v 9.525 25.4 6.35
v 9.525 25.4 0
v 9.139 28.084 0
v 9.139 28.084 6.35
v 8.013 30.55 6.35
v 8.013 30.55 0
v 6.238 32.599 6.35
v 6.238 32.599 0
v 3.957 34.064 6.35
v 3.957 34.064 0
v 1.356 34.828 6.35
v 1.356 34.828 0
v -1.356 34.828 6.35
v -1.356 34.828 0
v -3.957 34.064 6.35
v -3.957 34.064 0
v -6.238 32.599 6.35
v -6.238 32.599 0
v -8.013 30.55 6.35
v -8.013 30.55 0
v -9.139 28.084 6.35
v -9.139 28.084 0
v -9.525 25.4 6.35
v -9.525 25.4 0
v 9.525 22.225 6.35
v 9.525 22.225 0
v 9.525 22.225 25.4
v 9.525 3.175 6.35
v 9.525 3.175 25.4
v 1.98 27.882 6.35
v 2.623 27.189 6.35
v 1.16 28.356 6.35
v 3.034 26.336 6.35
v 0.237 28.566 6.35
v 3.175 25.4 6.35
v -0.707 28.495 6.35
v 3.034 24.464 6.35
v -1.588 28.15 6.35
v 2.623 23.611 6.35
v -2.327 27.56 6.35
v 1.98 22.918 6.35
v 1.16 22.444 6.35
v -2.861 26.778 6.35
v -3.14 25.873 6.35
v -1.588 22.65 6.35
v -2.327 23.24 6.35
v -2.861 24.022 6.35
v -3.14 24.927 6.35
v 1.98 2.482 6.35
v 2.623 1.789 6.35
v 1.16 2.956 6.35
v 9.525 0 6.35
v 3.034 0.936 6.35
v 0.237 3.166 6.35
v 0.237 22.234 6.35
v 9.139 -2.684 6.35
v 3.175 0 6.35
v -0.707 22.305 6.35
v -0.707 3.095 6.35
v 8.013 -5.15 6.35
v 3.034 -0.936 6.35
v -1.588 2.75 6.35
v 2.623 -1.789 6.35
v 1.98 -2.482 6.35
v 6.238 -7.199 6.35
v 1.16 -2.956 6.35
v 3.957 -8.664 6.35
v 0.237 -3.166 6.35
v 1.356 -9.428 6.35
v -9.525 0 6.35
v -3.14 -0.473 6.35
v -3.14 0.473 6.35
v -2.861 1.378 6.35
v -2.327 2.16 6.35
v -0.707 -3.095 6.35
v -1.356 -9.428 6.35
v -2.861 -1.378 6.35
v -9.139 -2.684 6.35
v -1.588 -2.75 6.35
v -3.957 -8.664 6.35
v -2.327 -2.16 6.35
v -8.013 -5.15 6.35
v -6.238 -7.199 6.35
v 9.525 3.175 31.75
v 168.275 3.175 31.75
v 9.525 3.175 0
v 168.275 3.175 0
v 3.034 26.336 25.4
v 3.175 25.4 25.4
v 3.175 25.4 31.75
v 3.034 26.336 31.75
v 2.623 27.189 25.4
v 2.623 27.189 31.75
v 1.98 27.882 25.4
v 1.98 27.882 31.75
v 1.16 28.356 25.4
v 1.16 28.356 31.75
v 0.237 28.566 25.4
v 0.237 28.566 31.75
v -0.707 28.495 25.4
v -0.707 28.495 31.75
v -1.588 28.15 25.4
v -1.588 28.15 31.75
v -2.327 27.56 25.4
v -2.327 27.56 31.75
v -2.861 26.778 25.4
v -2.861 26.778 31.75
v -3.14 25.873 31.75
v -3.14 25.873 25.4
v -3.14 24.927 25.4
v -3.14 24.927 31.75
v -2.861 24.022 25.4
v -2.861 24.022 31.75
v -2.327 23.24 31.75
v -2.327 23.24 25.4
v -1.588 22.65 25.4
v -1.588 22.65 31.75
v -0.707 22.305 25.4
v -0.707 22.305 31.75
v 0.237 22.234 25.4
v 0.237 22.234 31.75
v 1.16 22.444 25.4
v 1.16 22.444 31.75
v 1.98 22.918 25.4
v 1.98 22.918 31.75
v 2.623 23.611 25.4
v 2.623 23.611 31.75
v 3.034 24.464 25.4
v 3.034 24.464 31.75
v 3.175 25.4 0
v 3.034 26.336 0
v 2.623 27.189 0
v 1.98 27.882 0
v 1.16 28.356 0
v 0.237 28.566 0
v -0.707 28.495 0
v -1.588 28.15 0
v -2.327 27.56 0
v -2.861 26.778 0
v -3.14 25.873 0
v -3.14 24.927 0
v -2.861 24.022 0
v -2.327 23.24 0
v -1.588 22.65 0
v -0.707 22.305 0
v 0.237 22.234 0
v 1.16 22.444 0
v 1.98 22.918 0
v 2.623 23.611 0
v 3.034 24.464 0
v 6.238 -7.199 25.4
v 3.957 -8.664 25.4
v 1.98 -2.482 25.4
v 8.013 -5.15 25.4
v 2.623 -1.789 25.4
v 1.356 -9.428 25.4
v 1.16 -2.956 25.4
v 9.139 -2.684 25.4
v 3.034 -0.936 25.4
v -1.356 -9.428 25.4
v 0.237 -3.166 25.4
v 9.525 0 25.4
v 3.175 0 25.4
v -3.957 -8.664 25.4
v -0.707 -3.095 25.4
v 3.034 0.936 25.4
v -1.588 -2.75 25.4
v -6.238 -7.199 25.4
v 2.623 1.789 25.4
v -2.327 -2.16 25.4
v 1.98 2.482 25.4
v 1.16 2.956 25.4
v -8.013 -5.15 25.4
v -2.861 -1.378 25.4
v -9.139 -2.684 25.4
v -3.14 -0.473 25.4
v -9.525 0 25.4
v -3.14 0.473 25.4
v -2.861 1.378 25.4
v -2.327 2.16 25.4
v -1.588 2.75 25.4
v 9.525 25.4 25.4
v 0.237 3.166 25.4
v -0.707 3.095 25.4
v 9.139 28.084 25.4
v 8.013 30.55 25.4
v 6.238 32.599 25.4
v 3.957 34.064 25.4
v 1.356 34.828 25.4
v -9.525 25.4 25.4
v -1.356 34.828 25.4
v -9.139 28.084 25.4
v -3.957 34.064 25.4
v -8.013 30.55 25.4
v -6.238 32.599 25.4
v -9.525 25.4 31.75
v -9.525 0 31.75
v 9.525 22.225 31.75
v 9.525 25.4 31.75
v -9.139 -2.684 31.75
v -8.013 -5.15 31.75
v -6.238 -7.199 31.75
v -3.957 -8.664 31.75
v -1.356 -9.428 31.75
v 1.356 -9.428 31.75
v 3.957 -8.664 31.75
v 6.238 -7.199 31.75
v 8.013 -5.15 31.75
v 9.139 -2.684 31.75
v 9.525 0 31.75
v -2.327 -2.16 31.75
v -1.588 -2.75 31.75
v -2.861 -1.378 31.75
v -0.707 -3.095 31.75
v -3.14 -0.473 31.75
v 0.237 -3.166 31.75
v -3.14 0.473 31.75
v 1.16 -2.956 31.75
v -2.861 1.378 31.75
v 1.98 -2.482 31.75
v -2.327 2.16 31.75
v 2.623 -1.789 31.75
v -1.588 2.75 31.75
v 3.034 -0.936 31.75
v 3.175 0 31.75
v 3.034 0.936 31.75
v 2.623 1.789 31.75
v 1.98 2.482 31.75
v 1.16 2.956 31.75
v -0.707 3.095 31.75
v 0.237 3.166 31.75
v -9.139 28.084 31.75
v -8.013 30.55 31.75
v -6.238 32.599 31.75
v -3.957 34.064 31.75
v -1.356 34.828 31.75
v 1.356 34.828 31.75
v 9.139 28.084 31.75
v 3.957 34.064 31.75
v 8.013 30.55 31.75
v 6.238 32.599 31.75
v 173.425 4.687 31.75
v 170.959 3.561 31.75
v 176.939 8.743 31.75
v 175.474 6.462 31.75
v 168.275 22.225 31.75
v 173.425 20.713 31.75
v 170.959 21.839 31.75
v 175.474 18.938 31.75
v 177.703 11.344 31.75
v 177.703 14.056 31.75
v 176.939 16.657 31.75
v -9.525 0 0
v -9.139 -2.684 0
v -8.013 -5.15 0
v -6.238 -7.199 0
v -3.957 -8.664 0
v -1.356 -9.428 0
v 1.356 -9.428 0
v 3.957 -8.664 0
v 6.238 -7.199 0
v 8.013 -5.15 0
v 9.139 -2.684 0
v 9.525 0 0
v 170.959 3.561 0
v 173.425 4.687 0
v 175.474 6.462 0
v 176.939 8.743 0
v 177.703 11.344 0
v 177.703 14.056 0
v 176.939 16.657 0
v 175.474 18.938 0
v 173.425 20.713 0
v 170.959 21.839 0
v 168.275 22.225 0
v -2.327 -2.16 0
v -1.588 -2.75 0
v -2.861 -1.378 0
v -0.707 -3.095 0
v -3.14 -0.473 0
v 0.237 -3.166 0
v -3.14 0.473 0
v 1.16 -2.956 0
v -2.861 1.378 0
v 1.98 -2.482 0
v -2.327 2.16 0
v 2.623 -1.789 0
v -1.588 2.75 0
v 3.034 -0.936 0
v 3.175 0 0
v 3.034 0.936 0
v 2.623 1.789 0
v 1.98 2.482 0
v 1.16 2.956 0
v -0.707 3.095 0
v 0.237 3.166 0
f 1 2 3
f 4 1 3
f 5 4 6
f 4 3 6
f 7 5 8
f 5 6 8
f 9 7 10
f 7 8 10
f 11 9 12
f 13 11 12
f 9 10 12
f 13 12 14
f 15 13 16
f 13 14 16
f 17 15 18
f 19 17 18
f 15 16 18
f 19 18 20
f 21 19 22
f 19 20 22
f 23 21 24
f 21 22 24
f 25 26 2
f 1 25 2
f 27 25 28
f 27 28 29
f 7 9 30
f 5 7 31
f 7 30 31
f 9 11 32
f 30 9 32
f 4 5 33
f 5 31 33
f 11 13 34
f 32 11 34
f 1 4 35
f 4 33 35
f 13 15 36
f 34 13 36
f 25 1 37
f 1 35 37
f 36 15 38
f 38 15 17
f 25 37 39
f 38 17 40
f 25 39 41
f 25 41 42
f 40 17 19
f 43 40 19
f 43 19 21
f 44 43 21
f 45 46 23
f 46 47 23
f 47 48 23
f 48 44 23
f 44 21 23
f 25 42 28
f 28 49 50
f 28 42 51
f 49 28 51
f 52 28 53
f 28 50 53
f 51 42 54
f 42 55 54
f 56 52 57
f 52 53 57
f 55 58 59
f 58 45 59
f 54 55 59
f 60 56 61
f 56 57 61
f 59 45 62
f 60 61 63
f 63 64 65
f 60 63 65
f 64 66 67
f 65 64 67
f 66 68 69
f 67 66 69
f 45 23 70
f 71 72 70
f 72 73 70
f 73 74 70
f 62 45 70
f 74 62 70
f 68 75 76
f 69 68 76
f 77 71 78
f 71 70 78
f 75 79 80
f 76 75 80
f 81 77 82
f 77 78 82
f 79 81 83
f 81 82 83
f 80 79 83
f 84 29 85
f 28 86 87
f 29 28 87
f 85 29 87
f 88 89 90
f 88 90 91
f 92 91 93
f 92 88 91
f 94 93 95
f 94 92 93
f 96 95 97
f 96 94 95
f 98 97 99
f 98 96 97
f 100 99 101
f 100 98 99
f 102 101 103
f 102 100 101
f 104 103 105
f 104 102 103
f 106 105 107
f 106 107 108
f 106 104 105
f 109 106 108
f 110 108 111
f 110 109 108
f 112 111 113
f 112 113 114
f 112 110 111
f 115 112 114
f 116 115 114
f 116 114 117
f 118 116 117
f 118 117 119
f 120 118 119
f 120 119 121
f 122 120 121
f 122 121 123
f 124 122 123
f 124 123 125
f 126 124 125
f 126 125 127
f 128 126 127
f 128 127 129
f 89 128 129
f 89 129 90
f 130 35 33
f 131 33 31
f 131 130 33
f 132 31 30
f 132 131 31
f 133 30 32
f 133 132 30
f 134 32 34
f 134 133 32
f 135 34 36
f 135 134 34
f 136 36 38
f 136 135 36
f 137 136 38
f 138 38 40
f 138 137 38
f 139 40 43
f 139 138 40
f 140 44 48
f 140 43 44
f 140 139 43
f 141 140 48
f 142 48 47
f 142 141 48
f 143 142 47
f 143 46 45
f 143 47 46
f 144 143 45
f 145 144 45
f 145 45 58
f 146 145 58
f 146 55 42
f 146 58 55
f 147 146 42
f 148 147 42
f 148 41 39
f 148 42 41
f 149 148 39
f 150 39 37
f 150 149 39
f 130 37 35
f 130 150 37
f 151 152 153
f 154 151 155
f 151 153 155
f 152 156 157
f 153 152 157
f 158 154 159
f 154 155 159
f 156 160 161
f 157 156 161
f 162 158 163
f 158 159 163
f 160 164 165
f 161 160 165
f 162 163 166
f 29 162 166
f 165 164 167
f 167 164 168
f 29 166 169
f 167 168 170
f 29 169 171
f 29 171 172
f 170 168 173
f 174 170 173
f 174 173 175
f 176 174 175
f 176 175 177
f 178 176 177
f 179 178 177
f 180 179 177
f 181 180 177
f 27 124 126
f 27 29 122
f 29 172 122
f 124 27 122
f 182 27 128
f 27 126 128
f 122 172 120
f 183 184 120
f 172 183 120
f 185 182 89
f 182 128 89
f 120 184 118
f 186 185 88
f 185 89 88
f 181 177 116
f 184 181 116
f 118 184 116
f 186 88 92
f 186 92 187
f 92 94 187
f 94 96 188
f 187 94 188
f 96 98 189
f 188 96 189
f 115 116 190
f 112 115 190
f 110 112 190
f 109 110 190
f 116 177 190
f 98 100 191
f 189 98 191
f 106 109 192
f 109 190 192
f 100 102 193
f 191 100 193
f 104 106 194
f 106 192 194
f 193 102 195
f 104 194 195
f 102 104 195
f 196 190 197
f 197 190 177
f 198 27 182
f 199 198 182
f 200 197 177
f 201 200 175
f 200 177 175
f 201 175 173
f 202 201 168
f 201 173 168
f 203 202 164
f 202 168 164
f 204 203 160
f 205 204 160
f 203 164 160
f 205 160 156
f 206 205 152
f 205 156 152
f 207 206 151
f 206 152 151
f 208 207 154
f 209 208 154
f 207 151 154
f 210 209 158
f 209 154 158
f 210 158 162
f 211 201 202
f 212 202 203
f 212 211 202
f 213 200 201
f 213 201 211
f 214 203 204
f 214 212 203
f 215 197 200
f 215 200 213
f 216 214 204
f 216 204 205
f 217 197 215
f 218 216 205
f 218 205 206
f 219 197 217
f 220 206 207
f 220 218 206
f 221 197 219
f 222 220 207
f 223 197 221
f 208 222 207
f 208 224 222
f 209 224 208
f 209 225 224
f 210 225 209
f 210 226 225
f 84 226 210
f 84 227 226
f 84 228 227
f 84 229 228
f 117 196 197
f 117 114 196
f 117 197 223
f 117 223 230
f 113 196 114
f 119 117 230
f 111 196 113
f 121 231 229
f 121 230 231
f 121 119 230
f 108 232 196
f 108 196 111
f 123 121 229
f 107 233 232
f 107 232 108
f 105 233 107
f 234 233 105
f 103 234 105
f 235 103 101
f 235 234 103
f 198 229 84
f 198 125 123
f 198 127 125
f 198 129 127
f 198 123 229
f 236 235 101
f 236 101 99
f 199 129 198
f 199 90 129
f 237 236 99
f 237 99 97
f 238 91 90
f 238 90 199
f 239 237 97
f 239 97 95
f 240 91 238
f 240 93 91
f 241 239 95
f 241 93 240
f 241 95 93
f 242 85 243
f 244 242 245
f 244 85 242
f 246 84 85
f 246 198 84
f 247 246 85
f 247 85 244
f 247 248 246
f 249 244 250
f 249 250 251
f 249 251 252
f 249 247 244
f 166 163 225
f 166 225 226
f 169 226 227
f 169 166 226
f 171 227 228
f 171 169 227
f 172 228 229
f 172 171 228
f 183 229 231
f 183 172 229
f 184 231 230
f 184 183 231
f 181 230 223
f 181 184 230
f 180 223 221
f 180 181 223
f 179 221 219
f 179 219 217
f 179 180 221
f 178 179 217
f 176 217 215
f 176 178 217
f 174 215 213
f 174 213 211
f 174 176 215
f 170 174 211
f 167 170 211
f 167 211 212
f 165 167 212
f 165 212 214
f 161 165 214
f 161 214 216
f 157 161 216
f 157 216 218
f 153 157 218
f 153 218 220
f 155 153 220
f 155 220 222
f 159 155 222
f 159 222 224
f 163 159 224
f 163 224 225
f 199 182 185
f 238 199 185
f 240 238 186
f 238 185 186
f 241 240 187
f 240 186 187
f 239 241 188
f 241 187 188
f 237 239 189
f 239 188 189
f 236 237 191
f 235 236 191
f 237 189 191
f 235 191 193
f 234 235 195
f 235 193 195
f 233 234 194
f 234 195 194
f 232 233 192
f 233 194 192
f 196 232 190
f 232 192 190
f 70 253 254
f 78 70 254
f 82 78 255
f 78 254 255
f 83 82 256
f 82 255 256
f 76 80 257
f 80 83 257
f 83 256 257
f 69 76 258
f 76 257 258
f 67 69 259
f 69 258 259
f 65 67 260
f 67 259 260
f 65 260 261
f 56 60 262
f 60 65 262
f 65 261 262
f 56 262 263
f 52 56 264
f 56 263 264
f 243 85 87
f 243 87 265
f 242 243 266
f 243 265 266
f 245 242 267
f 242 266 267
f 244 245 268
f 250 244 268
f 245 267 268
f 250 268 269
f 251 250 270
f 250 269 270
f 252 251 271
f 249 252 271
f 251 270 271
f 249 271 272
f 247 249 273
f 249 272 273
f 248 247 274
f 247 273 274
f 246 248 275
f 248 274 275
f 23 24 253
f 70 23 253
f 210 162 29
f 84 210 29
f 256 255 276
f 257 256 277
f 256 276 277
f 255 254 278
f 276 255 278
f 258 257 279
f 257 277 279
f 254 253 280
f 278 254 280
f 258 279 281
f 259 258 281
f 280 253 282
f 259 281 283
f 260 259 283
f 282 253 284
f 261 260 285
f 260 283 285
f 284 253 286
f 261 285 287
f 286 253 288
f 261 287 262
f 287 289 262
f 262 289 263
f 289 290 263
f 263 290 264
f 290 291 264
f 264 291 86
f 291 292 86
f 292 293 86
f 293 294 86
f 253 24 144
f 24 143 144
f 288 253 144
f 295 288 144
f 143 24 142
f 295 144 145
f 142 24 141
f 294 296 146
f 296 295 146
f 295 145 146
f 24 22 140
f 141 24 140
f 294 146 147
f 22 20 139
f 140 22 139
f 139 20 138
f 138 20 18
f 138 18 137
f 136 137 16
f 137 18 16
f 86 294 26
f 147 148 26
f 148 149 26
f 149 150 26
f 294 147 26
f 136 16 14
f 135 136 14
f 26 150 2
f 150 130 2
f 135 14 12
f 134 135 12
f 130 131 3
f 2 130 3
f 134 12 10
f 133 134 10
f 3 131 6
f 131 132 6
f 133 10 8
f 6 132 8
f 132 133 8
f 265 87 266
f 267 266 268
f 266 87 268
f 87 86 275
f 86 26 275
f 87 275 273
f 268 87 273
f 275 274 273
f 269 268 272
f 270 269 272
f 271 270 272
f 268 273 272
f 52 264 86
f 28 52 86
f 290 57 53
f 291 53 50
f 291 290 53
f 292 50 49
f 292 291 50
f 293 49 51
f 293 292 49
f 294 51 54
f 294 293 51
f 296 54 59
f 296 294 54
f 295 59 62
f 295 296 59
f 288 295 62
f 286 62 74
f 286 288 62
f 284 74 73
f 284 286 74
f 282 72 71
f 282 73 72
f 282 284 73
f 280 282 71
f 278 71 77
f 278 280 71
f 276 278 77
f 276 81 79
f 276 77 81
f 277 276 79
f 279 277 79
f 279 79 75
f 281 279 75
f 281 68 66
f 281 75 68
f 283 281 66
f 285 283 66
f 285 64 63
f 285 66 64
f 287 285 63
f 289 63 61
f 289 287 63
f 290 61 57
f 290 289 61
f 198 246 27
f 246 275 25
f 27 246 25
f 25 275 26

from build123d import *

# Parameters (mm, degrees)
SKETCH1_R           = 3.175
BOSS_EXTRUDE1_DEPTH = 31.75
SKETCH2_W           = 19.05
SKETCH2_H           = 25.4
SKETCH2_H_2         = 9.525
CUT_EXTRUDE1_DEPTH  = 19.05


with BuildPart() as part:
    # Sketch1 → Boss-Extrude1 (new body)
    with BuildSketch(Plane.XY):
        with BuildLine():
            Line((-9.525, 25.4), (-9.525, 0))
            ThreePointArc((-9.525, 0), (0, -9.525), (9.525, 0))
            Line((9.525, 0), (9.525, 3.175))
            Line((9.525, 3.175), (168.275, 3.175))
            ThreePointArc((168.275, 3.175), (177.8, 12.7), (168.275, 22.225))
            Line((168.275, 22.225), (9.525, 22.225))
            Line((9.525, 22.225), (9.525, 25.4))
            ThreePointArc((9.525, 25.4), (0, 34.925), (-9.525, 25.4))
        make_face()
        Circle(SKETCH1_R, mode=Mode.SUBTRACT)
        with Locations((0, 25.4)):
            Circle(SKETCH1_R, mode=Mode.SUBTRACT)
    extrude(amount=BOSS_EXTRUDE1_DEPTH)

    # Sketch2 → Cut-Extrude1 (cut)
    with BuildSketch(Plane.ZY.offset(9.525)):
        with Locations((15.875, 12.7)):
            Rectangle(SKETCH2_W, SKETCH2_H)
        with Locations((15.875, 30.1625)):
            Rectangle(SKETCH2_W, SKETCH2_H_2)
        with Locations((15.875, -4.7625)):
            Rectangle(SKETCH2_W, SKETCH2_H_2)
    extrude(amount=-CUT_EXTRUDE1_DEPTH, mode=Mode.SUBTRACT)


solid = part.part
